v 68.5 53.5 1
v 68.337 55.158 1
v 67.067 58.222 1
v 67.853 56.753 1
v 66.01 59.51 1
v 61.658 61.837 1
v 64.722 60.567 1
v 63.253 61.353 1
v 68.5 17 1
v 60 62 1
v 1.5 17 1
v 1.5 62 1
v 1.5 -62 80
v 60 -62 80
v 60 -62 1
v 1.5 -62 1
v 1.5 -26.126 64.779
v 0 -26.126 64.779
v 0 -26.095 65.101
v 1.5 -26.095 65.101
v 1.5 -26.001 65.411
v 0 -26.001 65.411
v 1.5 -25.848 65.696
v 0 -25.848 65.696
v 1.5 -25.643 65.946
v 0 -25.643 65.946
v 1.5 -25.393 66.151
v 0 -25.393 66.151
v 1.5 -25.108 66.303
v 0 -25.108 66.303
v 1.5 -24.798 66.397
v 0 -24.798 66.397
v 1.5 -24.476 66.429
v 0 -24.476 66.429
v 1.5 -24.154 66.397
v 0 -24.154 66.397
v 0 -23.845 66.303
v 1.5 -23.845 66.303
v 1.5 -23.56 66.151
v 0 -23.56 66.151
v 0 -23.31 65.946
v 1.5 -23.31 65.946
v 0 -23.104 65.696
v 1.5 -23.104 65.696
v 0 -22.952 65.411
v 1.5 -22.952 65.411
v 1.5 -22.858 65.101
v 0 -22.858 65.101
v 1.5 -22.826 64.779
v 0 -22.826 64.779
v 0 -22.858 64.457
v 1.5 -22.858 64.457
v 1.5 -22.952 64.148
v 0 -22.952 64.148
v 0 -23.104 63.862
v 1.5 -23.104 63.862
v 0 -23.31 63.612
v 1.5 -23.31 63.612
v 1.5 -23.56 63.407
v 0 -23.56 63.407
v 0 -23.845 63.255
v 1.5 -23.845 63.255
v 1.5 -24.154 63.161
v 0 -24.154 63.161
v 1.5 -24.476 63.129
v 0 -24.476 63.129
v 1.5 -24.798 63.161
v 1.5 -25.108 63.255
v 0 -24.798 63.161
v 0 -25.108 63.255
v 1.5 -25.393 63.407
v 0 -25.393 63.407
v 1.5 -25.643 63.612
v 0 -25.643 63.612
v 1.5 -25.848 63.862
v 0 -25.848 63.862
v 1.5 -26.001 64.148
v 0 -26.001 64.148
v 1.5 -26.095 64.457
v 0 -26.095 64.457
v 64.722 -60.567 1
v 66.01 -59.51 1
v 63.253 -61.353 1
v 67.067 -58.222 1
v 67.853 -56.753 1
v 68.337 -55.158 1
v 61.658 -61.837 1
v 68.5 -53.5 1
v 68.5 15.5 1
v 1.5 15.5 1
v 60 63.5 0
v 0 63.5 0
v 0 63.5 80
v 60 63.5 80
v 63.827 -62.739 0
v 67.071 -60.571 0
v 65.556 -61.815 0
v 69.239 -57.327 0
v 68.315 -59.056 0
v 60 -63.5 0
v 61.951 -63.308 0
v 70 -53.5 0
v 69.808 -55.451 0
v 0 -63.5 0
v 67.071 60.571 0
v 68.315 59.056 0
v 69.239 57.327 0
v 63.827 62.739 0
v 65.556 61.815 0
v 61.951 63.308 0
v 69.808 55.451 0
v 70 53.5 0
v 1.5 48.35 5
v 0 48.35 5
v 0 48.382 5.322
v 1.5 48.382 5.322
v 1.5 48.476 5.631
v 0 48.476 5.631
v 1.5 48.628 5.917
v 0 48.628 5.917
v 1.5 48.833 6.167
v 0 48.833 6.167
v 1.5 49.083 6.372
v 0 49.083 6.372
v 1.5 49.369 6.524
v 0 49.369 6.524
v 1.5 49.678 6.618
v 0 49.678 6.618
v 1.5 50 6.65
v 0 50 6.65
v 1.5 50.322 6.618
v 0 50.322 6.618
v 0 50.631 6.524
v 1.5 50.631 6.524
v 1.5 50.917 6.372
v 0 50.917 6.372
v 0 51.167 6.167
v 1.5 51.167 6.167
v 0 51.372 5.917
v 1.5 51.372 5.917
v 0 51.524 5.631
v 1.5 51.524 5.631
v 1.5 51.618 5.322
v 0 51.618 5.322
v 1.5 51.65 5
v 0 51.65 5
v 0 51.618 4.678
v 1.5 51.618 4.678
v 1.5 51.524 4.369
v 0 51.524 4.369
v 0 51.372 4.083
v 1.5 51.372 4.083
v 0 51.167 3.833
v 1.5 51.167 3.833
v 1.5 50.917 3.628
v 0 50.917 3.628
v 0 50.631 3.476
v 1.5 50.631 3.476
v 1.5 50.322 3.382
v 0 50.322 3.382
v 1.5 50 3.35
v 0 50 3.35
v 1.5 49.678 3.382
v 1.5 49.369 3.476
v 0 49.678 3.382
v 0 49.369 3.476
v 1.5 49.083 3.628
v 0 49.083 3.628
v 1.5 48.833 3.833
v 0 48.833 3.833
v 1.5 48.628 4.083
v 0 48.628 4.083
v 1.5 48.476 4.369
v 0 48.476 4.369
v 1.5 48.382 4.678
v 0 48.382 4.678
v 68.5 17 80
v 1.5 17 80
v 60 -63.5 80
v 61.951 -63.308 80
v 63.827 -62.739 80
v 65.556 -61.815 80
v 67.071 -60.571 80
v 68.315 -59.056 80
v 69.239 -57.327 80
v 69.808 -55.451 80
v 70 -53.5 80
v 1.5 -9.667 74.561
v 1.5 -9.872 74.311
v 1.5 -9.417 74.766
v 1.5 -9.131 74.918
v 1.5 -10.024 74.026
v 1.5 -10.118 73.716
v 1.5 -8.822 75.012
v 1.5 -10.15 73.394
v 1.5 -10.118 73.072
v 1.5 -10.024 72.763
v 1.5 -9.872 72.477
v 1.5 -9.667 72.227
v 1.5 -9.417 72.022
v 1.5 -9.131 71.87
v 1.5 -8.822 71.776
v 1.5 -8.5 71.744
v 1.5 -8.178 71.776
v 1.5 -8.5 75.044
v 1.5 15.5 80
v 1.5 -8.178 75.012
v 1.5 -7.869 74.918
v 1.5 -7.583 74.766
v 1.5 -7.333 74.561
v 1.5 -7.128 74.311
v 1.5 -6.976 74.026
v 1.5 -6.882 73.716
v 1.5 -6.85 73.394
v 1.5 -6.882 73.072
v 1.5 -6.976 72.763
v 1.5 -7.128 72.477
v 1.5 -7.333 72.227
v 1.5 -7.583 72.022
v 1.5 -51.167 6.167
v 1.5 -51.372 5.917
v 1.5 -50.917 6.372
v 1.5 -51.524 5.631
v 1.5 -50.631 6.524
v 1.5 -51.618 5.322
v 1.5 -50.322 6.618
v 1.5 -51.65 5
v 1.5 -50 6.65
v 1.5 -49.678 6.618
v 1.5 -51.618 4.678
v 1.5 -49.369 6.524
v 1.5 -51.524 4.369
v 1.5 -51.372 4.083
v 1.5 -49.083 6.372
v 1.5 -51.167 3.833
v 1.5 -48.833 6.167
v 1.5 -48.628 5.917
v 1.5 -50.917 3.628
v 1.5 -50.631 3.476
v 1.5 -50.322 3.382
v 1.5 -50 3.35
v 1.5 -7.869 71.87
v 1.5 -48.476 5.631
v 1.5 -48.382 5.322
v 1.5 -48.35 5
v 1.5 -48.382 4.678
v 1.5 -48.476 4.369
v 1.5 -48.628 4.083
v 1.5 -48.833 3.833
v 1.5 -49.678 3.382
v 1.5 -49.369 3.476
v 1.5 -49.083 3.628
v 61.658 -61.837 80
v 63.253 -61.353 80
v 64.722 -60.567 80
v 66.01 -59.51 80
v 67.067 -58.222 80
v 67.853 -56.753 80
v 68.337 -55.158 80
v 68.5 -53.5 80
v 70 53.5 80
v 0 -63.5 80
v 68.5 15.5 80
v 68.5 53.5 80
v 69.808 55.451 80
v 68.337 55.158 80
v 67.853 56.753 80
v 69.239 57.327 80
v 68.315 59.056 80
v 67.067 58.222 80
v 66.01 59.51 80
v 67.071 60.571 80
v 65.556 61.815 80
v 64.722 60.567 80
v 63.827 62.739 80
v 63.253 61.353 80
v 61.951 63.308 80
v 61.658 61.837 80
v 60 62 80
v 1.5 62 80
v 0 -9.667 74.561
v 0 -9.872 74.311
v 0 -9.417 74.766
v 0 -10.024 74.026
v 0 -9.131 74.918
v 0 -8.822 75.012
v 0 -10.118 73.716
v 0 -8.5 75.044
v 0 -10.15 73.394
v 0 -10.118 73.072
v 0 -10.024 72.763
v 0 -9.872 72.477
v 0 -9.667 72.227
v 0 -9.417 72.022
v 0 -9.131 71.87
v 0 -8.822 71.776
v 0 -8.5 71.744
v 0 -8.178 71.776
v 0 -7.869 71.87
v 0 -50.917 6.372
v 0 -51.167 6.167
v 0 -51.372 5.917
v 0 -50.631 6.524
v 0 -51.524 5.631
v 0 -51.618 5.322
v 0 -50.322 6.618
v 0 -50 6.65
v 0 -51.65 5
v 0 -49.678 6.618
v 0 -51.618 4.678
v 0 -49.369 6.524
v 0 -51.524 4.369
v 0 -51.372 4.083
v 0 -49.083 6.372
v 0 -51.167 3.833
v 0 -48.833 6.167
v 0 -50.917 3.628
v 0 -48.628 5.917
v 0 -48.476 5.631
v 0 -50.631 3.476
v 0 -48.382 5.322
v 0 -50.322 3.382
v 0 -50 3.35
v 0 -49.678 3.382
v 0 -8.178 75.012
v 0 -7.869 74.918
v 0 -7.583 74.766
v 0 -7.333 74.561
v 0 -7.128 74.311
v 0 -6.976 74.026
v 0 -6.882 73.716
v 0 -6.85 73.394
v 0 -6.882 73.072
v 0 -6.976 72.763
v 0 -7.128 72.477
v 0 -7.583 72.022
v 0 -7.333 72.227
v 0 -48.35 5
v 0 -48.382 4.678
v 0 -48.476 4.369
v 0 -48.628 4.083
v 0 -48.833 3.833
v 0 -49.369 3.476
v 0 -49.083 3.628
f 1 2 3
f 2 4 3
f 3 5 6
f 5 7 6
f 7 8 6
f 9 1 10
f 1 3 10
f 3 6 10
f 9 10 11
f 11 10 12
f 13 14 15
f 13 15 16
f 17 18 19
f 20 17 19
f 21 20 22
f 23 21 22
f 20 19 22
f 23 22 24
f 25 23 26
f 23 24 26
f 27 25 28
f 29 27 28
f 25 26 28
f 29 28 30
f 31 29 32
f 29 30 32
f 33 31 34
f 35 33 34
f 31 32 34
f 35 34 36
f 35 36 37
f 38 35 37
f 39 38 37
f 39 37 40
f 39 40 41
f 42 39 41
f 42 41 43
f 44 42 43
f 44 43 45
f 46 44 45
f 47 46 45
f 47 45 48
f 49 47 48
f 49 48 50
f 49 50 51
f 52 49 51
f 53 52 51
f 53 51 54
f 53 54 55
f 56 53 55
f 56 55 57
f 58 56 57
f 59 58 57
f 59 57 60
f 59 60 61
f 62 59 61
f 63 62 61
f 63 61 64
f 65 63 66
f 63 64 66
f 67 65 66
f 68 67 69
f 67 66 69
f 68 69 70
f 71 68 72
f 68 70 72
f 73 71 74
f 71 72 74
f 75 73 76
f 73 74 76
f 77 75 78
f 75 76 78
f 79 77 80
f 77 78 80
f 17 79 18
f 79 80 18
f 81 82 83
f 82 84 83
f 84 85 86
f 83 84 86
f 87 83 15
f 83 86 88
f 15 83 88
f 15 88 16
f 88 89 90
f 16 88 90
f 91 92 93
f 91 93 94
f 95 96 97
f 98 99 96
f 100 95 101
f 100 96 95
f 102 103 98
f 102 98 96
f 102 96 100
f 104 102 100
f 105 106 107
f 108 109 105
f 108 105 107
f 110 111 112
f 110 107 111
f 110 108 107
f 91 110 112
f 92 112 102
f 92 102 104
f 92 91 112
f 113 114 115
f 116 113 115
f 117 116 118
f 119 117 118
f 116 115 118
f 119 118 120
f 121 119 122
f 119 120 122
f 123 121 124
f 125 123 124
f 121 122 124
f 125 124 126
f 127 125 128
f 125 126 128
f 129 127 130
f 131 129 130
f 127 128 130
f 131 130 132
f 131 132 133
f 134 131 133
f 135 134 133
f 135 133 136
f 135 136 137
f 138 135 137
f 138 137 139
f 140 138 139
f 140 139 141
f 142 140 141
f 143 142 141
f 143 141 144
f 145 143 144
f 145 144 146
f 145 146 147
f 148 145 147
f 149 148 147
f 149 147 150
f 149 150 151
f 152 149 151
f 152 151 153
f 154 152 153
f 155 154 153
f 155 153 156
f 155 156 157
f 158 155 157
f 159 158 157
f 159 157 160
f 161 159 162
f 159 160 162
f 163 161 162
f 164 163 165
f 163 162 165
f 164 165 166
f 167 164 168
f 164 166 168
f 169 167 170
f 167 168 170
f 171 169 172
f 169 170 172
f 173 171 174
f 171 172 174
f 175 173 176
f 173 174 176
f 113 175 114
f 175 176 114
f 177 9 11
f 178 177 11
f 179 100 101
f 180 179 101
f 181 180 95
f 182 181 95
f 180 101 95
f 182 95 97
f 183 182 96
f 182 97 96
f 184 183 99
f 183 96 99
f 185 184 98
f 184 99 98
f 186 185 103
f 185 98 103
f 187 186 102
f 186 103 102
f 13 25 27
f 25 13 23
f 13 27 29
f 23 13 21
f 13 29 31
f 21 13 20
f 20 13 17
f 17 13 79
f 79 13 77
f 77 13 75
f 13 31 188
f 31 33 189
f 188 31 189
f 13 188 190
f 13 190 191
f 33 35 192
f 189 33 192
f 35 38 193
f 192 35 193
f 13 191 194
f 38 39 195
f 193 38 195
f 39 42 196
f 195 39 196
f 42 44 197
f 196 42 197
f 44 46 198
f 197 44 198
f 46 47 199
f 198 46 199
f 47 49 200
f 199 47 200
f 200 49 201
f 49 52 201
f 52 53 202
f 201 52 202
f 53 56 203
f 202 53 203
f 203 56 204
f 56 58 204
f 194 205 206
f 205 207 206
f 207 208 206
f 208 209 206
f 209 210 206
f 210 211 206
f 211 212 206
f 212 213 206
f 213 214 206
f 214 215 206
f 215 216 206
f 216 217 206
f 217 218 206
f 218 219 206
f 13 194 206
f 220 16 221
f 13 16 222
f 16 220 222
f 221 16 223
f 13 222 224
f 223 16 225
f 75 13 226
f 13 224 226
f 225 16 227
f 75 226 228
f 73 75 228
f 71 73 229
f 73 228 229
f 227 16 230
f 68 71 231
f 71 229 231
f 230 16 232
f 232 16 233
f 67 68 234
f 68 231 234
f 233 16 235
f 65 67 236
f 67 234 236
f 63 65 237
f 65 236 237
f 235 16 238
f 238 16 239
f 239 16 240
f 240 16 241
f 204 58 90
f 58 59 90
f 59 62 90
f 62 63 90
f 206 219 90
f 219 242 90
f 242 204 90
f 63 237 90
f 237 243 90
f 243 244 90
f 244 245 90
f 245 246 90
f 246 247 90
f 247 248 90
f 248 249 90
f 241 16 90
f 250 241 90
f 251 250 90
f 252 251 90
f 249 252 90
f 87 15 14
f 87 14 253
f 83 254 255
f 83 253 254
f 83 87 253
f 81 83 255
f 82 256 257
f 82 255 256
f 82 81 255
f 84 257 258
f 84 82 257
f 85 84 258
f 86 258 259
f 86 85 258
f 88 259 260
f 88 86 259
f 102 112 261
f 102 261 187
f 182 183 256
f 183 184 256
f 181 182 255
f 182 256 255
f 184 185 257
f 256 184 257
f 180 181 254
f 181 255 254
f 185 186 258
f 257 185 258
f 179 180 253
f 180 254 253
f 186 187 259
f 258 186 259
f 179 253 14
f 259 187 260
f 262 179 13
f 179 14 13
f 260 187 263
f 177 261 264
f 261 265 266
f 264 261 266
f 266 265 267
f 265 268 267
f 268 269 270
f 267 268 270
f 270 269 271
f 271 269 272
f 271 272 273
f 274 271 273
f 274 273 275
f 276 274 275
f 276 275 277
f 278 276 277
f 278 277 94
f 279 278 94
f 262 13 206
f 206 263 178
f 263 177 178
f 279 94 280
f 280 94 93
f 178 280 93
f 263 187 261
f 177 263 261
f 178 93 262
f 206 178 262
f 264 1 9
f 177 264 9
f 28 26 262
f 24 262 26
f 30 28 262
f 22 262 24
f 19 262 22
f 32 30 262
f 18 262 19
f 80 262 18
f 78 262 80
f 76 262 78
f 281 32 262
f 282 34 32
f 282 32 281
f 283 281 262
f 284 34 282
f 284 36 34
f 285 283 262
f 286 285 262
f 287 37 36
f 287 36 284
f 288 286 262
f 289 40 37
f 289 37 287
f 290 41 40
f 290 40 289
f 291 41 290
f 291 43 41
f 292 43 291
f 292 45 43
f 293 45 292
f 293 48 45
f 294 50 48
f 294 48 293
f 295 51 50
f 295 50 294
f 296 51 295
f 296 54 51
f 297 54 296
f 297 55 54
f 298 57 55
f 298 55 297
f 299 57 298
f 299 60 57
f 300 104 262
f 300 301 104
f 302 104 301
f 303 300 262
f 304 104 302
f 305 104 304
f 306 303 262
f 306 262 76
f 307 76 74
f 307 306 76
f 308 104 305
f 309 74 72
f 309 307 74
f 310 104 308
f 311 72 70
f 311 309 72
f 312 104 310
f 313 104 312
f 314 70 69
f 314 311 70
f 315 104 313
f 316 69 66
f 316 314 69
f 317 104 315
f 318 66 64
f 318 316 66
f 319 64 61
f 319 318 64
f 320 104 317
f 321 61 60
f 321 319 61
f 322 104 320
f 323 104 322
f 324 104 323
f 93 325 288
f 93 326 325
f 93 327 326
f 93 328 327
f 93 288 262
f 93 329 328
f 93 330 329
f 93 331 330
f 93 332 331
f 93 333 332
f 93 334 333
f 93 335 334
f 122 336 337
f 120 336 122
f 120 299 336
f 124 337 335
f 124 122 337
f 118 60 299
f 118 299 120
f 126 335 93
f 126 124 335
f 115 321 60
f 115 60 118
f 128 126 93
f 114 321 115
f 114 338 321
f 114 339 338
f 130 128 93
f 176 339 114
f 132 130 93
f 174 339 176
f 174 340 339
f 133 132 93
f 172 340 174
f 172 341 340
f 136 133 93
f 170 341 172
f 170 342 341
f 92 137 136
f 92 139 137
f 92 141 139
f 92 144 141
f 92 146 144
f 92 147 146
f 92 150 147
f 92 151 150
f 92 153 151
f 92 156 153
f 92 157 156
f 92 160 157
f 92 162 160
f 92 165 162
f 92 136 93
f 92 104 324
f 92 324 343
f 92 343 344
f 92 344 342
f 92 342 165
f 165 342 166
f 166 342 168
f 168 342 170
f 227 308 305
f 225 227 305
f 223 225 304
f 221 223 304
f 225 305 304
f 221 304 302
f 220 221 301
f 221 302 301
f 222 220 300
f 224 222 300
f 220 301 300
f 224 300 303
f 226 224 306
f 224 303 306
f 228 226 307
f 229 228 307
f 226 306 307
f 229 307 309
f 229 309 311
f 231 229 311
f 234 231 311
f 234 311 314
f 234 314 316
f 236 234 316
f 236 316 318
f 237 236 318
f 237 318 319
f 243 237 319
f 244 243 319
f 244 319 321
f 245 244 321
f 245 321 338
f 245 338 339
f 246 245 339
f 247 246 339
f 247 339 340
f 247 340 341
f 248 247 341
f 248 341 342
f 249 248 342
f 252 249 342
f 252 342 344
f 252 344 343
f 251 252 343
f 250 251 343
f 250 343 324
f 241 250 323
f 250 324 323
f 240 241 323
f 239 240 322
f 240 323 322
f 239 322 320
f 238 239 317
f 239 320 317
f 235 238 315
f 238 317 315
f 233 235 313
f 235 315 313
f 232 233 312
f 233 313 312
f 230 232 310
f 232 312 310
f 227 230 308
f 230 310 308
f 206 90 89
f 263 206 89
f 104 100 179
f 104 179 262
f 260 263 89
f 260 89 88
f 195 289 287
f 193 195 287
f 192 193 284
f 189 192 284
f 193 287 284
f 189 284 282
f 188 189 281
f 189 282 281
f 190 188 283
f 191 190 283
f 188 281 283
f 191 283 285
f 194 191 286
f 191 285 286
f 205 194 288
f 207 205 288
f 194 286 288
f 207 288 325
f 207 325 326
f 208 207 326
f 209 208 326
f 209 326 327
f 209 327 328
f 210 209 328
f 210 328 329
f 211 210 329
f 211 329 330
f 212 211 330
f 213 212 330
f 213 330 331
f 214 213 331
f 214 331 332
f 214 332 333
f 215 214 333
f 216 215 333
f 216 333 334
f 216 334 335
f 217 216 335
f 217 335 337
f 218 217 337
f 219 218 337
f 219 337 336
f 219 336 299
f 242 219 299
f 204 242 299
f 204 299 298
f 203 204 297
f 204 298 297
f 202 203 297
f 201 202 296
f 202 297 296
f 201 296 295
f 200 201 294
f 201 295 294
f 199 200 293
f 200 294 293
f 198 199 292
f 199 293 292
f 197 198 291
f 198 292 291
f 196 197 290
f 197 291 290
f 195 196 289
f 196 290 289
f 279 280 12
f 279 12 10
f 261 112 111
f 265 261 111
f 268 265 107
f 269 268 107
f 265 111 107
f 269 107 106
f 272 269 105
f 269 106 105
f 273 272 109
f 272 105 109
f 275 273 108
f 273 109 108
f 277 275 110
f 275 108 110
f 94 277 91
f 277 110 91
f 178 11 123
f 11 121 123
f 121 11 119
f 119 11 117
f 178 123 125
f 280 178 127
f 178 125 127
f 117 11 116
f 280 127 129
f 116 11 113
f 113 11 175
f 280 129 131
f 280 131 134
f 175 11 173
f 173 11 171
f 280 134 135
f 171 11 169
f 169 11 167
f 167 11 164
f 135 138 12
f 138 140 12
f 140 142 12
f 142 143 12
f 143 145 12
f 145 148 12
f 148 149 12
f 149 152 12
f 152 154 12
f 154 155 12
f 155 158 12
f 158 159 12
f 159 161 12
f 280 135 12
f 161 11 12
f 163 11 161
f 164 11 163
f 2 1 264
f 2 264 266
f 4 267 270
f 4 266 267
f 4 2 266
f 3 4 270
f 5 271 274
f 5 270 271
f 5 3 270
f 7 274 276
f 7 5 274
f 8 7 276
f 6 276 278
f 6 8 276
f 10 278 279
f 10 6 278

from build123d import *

# Parameters (mm, degrees)
PAD_DEPTH       = 80
POCKET_DEPTH    = 79.001
SKETCH002_R     = 1.65
POCKET001_DEPTH = 5


with BuildPart() as part:
    # Sketch → Pad (new body)
    with BuildSketch(Plane.XY):
        with BuildLine():
            Line((0, 63.5), (60, 63.5))
            ThreePointArc((70, 53.5), (67.071068, 60.571068), (60, 63.5))
            Line((70, 53.5), (70, -53.5))
            ThreePointArc((60, -63.5), (67.071068, -60.571068), (70, -53.5))
            Line((60, -63.5), (0, -63.5))
            Line((0, -63.5), (0, 63.5))
        make_face()
    extrude(amount=PAD_DEPTH)

    # Sketch001 → Pocket (cut, through all)
    with BuildSketch(Plane.XY.offset(1)):
        with BuildLine():
            Line((1.5, 62), (60, 62))
            ThreePointArc((68.5, 53.5), (66.010408, 59.510408), (60, 62))
            Line((68.5, 53.5), (68.5, 17))
            Line((68.5, 17), (1.5, 17))
            Line((1.5, 17), (1.5, 62))
        make_face()
        with BuildLine():
            Line((1.5, 15.5), (68.5, 15.5))
            Line((68.5, 15.5), (68.5, -53.5))
            ThreePointArc((60, -62), (66.010408, -59.510408), (68.5, -53.5))
            Line((60, -62), (1.5, -62))
            Line((1.5, -62), (1.5, 15.5))
        make_face()
    extrude(amount=POCKET_DEPTH, mode=Mode.SUBTRACT)

    # Sketch002 → Pocket001 (cut)
    with BuildSketch(Plane(origin=(0, 0, 0), x_dir=(0, -1, 0), z_dir=(-1, 0, 0))):
        with Locations((-50, 5)):
            Circle(SKETCH002_R)
        with Locations((50, 5)):
            Circle(SKETCH002_R)
        with Locations((8.5, 73.394079)):
            Circle(SKETCH002_R)
        with Locations((24.47625, 64.779078)):
            Circle(SKETCH002_R)
    extrude(amount=-POCKET001_DEPTH, mode=Mode.SUBTRACT)


solid = part.part
